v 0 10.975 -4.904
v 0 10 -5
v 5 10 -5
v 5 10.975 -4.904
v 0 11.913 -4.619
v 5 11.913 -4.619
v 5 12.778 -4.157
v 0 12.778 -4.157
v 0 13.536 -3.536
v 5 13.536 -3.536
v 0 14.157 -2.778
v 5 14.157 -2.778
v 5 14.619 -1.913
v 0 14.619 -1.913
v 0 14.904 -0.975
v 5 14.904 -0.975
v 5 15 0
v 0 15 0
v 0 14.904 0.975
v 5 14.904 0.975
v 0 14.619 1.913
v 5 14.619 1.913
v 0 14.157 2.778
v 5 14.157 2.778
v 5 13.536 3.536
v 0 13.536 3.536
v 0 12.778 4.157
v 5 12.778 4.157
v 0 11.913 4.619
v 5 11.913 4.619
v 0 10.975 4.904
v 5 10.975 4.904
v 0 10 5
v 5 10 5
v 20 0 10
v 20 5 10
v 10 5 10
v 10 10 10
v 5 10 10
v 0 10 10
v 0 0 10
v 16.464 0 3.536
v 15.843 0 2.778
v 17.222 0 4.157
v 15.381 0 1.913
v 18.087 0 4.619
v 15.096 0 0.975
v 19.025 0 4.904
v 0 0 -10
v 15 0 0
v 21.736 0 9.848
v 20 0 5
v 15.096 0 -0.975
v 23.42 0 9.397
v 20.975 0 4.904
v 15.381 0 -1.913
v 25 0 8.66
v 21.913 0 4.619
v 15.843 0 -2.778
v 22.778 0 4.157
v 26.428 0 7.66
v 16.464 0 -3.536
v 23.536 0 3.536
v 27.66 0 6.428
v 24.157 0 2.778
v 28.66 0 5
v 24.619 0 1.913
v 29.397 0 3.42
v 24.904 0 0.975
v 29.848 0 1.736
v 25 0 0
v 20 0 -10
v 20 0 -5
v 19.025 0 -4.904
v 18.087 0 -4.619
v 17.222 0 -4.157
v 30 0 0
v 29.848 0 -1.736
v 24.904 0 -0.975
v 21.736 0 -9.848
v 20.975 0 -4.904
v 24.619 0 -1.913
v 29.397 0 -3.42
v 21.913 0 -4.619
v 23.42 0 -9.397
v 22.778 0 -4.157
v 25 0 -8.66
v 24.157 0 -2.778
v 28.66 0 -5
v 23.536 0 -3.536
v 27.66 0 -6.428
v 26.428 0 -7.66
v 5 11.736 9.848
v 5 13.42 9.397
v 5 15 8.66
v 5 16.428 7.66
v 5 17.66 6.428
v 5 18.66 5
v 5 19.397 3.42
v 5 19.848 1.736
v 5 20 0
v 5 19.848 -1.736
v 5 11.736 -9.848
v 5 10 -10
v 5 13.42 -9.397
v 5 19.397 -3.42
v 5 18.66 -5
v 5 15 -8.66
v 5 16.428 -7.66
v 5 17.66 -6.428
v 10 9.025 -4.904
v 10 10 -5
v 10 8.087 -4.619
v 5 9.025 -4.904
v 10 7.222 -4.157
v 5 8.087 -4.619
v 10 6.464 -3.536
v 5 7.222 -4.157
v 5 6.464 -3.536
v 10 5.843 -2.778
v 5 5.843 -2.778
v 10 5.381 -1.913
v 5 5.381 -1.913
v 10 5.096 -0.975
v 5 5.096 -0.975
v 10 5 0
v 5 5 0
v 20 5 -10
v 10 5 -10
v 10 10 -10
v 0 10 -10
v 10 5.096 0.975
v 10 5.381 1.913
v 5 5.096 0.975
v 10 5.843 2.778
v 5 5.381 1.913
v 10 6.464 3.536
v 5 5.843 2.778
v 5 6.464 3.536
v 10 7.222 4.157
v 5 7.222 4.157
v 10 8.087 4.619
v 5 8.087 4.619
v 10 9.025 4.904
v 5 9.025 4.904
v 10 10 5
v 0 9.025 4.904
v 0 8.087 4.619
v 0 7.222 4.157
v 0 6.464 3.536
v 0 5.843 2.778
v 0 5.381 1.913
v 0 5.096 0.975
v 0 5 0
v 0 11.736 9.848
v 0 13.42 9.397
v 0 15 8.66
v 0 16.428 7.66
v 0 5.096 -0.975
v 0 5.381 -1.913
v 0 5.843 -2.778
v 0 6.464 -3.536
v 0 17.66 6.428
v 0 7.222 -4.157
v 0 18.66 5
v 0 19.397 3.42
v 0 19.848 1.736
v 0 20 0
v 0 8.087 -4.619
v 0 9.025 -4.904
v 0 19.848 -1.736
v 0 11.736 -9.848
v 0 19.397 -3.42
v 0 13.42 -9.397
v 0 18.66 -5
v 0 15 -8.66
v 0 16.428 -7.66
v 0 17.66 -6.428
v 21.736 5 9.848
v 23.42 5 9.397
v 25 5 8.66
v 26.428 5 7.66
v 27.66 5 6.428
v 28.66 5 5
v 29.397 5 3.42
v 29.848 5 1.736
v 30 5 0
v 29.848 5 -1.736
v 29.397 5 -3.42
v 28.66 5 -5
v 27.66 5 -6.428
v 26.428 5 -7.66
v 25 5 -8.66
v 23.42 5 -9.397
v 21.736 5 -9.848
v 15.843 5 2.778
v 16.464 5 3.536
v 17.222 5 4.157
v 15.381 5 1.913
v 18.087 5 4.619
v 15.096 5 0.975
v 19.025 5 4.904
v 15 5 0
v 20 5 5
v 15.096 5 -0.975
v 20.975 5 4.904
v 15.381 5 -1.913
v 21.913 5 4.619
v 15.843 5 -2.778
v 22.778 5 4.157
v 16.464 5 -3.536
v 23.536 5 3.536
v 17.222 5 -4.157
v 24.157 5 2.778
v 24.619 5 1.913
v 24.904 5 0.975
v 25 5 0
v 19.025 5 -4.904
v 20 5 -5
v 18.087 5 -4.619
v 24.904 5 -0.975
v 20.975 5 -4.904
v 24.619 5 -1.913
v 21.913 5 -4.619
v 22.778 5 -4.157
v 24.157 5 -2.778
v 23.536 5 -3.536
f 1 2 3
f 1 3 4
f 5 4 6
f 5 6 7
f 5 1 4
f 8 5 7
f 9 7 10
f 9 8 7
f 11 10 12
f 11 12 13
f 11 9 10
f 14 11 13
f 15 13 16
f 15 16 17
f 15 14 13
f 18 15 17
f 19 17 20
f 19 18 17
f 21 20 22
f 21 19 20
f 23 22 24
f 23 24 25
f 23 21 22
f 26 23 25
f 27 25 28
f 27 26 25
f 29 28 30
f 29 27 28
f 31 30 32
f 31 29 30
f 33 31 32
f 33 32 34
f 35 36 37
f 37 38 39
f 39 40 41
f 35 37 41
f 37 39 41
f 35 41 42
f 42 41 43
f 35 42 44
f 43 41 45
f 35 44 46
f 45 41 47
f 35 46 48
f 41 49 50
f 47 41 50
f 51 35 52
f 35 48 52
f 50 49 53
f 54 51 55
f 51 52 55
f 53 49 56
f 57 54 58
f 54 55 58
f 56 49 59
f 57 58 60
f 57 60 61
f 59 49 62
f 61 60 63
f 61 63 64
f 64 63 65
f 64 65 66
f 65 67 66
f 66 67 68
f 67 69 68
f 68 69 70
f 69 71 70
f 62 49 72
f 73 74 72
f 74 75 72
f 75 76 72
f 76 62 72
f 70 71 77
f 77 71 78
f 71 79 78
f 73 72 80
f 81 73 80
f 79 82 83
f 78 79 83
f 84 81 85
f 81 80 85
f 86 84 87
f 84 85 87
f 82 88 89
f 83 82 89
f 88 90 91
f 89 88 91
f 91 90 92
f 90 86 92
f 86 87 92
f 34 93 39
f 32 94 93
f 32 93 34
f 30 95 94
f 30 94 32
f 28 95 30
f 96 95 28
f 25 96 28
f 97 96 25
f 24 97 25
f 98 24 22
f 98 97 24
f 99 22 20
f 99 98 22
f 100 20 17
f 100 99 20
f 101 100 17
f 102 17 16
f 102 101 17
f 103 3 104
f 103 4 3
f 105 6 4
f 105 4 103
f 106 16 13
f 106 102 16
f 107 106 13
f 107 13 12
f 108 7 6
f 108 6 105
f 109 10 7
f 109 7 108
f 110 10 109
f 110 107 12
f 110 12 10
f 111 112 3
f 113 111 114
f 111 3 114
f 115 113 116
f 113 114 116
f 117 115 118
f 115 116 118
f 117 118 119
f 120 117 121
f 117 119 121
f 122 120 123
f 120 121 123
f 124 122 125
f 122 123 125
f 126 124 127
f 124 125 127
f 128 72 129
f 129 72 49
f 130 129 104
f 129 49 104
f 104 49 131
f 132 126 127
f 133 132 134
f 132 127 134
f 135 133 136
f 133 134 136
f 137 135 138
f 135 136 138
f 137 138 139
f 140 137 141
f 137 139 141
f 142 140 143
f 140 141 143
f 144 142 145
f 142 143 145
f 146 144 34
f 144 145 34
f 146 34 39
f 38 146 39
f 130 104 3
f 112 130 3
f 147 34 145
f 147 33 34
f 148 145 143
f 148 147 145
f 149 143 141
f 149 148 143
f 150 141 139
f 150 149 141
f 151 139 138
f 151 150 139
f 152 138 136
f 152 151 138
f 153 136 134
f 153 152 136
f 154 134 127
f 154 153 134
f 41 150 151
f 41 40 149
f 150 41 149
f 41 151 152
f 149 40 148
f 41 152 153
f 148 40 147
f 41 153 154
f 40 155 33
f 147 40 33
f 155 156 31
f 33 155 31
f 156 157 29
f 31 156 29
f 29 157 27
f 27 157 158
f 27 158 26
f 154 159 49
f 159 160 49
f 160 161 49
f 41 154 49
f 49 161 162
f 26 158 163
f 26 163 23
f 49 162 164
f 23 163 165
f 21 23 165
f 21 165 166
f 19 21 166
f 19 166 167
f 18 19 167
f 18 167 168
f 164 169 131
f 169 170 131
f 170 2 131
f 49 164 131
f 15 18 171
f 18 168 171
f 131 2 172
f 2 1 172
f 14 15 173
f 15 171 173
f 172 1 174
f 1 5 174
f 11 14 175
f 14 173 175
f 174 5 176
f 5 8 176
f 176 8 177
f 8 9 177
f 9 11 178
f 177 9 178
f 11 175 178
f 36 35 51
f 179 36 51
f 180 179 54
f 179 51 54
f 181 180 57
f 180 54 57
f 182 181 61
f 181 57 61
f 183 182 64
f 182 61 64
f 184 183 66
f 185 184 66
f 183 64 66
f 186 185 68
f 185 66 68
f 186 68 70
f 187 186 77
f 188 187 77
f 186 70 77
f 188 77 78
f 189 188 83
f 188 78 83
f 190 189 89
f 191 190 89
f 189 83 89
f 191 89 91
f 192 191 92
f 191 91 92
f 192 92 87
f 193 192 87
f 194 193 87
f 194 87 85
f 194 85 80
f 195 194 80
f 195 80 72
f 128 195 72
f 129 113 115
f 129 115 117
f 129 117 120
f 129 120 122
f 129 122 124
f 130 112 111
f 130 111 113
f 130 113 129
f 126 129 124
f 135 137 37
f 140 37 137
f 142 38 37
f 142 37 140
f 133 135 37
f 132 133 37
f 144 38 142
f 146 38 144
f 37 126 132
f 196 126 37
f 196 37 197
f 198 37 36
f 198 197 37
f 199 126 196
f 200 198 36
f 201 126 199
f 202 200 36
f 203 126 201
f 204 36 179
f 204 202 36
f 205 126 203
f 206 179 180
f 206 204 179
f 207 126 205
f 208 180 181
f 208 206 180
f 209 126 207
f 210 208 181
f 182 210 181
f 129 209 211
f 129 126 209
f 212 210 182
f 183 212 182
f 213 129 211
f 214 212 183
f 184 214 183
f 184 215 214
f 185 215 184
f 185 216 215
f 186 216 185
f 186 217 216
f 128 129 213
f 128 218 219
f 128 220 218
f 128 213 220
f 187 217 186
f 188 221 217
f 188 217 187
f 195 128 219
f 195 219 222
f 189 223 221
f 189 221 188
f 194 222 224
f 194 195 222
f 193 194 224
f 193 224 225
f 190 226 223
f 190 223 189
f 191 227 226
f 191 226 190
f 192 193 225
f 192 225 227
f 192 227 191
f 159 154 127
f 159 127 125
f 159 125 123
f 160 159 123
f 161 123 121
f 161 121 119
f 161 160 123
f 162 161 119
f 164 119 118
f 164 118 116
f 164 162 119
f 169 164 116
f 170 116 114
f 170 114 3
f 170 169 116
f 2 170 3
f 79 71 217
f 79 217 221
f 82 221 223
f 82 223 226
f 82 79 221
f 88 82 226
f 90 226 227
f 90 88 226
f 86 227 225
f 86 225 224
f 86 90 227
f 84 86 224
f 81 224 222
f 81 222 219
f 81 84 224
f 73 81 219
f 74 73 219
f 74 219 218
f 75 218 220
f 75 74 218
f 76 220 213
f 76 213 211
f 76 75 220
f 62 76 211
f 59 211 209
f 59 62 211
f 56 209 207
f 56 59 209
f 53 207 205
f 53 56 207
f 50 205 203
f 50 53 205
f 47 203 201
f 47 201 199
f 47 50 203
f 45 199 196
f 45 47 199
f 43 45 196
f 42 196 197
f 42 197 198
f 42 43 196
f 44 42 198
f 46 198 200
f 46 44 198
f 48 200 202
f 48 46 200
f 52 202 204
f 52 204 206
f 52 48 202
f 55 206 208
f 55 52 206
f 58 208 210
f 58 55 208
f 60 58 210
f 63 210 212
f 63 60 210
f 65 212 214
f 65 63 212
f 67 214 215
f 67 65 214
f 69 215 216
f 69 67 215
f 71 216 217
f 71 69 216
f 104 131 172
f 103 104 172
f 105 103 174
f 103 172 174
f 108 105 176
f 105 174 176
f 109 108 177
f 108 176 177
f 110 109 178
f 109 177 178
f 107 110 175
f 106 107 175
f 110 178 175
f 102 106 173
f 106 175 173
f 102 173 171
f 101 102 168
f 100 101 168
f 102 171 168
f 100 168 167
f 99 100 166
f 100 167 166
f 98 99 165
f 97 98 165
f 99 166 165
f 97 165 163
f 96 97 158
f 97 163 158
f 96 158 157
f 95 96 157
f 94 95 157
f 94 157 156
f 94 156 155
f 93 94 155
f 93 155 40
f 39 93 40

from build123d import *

# Parameters (mm, degrees)
SKETCH_1_R      = 5
EXTRUDE_1_DEPTH = 5
SKETCH_2_R      = 5
EXTRUDE_3_DEPTH = 5
EXTRUDE_4_DEPTH = 10


with BuildPart() as part:
    # 草圖1 → 填料-伸長1 (new body)
    with BuildSketch(Plane(origin=(0, 0, 0), x_dir=(1, 0, 0), z_dir=(0, 1, 0))):
        with BuildLine():
            Line((20, 10), (0, 10))
            Line((0, 10), (0, -10))
            Line((0, -10), (20, -10))
            ThreePointArc((20, -10), (30, 0), (20, 10))
        make_face()
        with Locations((20, 0)):
            Circle(SKETCH_1_R, mode=Mode.SUBTRACT)
    extrude(amount=EXTRUDE_1_DEPTH)

    # 草圖2 → 填料-伸長3 (add)
    with BuildSketch(Plane(origin=(0, 0, 0), x_dir=(0, 0, -1), z_dir=(1, 0, 0))):
        with BuildLine():
            Line((-10, 10), (-10, 0))
            Line((-10, 0), (10, 0))
            Line((10, 0), (10, 10))
            ThreePointArc((10, 10), (0, 20), (-10, 10))
        make_face()
        with Locations((0, 10)):
            Circle(SKETCH_2_R, mode=Mode.SUBTRACT)
    extrude(amount=EXTRUDE_3_DEPTH)

    # 草圖2<4> → 填料-伸長4 (add)
    with BuildSketch(Plane(origin=(0, 0, 0), x_dir=(0, 0, -1), z_dir=(1, 0, 0))):
        with BuildLine():
            Line((-5, 10), (-10, 10))
            Line((-10, 10), (-10, 0))
            Line((-10, 0), (10, 0))
            Line((10, 0), (10, 10))
            Line((10, 10), (5, 10))
            ThreePointArc((5, 10), (0, 5), (-5, 10))
        make_face()
    extrude(amount=EXTRUDE_4_DEPTH)


solid = part.part
